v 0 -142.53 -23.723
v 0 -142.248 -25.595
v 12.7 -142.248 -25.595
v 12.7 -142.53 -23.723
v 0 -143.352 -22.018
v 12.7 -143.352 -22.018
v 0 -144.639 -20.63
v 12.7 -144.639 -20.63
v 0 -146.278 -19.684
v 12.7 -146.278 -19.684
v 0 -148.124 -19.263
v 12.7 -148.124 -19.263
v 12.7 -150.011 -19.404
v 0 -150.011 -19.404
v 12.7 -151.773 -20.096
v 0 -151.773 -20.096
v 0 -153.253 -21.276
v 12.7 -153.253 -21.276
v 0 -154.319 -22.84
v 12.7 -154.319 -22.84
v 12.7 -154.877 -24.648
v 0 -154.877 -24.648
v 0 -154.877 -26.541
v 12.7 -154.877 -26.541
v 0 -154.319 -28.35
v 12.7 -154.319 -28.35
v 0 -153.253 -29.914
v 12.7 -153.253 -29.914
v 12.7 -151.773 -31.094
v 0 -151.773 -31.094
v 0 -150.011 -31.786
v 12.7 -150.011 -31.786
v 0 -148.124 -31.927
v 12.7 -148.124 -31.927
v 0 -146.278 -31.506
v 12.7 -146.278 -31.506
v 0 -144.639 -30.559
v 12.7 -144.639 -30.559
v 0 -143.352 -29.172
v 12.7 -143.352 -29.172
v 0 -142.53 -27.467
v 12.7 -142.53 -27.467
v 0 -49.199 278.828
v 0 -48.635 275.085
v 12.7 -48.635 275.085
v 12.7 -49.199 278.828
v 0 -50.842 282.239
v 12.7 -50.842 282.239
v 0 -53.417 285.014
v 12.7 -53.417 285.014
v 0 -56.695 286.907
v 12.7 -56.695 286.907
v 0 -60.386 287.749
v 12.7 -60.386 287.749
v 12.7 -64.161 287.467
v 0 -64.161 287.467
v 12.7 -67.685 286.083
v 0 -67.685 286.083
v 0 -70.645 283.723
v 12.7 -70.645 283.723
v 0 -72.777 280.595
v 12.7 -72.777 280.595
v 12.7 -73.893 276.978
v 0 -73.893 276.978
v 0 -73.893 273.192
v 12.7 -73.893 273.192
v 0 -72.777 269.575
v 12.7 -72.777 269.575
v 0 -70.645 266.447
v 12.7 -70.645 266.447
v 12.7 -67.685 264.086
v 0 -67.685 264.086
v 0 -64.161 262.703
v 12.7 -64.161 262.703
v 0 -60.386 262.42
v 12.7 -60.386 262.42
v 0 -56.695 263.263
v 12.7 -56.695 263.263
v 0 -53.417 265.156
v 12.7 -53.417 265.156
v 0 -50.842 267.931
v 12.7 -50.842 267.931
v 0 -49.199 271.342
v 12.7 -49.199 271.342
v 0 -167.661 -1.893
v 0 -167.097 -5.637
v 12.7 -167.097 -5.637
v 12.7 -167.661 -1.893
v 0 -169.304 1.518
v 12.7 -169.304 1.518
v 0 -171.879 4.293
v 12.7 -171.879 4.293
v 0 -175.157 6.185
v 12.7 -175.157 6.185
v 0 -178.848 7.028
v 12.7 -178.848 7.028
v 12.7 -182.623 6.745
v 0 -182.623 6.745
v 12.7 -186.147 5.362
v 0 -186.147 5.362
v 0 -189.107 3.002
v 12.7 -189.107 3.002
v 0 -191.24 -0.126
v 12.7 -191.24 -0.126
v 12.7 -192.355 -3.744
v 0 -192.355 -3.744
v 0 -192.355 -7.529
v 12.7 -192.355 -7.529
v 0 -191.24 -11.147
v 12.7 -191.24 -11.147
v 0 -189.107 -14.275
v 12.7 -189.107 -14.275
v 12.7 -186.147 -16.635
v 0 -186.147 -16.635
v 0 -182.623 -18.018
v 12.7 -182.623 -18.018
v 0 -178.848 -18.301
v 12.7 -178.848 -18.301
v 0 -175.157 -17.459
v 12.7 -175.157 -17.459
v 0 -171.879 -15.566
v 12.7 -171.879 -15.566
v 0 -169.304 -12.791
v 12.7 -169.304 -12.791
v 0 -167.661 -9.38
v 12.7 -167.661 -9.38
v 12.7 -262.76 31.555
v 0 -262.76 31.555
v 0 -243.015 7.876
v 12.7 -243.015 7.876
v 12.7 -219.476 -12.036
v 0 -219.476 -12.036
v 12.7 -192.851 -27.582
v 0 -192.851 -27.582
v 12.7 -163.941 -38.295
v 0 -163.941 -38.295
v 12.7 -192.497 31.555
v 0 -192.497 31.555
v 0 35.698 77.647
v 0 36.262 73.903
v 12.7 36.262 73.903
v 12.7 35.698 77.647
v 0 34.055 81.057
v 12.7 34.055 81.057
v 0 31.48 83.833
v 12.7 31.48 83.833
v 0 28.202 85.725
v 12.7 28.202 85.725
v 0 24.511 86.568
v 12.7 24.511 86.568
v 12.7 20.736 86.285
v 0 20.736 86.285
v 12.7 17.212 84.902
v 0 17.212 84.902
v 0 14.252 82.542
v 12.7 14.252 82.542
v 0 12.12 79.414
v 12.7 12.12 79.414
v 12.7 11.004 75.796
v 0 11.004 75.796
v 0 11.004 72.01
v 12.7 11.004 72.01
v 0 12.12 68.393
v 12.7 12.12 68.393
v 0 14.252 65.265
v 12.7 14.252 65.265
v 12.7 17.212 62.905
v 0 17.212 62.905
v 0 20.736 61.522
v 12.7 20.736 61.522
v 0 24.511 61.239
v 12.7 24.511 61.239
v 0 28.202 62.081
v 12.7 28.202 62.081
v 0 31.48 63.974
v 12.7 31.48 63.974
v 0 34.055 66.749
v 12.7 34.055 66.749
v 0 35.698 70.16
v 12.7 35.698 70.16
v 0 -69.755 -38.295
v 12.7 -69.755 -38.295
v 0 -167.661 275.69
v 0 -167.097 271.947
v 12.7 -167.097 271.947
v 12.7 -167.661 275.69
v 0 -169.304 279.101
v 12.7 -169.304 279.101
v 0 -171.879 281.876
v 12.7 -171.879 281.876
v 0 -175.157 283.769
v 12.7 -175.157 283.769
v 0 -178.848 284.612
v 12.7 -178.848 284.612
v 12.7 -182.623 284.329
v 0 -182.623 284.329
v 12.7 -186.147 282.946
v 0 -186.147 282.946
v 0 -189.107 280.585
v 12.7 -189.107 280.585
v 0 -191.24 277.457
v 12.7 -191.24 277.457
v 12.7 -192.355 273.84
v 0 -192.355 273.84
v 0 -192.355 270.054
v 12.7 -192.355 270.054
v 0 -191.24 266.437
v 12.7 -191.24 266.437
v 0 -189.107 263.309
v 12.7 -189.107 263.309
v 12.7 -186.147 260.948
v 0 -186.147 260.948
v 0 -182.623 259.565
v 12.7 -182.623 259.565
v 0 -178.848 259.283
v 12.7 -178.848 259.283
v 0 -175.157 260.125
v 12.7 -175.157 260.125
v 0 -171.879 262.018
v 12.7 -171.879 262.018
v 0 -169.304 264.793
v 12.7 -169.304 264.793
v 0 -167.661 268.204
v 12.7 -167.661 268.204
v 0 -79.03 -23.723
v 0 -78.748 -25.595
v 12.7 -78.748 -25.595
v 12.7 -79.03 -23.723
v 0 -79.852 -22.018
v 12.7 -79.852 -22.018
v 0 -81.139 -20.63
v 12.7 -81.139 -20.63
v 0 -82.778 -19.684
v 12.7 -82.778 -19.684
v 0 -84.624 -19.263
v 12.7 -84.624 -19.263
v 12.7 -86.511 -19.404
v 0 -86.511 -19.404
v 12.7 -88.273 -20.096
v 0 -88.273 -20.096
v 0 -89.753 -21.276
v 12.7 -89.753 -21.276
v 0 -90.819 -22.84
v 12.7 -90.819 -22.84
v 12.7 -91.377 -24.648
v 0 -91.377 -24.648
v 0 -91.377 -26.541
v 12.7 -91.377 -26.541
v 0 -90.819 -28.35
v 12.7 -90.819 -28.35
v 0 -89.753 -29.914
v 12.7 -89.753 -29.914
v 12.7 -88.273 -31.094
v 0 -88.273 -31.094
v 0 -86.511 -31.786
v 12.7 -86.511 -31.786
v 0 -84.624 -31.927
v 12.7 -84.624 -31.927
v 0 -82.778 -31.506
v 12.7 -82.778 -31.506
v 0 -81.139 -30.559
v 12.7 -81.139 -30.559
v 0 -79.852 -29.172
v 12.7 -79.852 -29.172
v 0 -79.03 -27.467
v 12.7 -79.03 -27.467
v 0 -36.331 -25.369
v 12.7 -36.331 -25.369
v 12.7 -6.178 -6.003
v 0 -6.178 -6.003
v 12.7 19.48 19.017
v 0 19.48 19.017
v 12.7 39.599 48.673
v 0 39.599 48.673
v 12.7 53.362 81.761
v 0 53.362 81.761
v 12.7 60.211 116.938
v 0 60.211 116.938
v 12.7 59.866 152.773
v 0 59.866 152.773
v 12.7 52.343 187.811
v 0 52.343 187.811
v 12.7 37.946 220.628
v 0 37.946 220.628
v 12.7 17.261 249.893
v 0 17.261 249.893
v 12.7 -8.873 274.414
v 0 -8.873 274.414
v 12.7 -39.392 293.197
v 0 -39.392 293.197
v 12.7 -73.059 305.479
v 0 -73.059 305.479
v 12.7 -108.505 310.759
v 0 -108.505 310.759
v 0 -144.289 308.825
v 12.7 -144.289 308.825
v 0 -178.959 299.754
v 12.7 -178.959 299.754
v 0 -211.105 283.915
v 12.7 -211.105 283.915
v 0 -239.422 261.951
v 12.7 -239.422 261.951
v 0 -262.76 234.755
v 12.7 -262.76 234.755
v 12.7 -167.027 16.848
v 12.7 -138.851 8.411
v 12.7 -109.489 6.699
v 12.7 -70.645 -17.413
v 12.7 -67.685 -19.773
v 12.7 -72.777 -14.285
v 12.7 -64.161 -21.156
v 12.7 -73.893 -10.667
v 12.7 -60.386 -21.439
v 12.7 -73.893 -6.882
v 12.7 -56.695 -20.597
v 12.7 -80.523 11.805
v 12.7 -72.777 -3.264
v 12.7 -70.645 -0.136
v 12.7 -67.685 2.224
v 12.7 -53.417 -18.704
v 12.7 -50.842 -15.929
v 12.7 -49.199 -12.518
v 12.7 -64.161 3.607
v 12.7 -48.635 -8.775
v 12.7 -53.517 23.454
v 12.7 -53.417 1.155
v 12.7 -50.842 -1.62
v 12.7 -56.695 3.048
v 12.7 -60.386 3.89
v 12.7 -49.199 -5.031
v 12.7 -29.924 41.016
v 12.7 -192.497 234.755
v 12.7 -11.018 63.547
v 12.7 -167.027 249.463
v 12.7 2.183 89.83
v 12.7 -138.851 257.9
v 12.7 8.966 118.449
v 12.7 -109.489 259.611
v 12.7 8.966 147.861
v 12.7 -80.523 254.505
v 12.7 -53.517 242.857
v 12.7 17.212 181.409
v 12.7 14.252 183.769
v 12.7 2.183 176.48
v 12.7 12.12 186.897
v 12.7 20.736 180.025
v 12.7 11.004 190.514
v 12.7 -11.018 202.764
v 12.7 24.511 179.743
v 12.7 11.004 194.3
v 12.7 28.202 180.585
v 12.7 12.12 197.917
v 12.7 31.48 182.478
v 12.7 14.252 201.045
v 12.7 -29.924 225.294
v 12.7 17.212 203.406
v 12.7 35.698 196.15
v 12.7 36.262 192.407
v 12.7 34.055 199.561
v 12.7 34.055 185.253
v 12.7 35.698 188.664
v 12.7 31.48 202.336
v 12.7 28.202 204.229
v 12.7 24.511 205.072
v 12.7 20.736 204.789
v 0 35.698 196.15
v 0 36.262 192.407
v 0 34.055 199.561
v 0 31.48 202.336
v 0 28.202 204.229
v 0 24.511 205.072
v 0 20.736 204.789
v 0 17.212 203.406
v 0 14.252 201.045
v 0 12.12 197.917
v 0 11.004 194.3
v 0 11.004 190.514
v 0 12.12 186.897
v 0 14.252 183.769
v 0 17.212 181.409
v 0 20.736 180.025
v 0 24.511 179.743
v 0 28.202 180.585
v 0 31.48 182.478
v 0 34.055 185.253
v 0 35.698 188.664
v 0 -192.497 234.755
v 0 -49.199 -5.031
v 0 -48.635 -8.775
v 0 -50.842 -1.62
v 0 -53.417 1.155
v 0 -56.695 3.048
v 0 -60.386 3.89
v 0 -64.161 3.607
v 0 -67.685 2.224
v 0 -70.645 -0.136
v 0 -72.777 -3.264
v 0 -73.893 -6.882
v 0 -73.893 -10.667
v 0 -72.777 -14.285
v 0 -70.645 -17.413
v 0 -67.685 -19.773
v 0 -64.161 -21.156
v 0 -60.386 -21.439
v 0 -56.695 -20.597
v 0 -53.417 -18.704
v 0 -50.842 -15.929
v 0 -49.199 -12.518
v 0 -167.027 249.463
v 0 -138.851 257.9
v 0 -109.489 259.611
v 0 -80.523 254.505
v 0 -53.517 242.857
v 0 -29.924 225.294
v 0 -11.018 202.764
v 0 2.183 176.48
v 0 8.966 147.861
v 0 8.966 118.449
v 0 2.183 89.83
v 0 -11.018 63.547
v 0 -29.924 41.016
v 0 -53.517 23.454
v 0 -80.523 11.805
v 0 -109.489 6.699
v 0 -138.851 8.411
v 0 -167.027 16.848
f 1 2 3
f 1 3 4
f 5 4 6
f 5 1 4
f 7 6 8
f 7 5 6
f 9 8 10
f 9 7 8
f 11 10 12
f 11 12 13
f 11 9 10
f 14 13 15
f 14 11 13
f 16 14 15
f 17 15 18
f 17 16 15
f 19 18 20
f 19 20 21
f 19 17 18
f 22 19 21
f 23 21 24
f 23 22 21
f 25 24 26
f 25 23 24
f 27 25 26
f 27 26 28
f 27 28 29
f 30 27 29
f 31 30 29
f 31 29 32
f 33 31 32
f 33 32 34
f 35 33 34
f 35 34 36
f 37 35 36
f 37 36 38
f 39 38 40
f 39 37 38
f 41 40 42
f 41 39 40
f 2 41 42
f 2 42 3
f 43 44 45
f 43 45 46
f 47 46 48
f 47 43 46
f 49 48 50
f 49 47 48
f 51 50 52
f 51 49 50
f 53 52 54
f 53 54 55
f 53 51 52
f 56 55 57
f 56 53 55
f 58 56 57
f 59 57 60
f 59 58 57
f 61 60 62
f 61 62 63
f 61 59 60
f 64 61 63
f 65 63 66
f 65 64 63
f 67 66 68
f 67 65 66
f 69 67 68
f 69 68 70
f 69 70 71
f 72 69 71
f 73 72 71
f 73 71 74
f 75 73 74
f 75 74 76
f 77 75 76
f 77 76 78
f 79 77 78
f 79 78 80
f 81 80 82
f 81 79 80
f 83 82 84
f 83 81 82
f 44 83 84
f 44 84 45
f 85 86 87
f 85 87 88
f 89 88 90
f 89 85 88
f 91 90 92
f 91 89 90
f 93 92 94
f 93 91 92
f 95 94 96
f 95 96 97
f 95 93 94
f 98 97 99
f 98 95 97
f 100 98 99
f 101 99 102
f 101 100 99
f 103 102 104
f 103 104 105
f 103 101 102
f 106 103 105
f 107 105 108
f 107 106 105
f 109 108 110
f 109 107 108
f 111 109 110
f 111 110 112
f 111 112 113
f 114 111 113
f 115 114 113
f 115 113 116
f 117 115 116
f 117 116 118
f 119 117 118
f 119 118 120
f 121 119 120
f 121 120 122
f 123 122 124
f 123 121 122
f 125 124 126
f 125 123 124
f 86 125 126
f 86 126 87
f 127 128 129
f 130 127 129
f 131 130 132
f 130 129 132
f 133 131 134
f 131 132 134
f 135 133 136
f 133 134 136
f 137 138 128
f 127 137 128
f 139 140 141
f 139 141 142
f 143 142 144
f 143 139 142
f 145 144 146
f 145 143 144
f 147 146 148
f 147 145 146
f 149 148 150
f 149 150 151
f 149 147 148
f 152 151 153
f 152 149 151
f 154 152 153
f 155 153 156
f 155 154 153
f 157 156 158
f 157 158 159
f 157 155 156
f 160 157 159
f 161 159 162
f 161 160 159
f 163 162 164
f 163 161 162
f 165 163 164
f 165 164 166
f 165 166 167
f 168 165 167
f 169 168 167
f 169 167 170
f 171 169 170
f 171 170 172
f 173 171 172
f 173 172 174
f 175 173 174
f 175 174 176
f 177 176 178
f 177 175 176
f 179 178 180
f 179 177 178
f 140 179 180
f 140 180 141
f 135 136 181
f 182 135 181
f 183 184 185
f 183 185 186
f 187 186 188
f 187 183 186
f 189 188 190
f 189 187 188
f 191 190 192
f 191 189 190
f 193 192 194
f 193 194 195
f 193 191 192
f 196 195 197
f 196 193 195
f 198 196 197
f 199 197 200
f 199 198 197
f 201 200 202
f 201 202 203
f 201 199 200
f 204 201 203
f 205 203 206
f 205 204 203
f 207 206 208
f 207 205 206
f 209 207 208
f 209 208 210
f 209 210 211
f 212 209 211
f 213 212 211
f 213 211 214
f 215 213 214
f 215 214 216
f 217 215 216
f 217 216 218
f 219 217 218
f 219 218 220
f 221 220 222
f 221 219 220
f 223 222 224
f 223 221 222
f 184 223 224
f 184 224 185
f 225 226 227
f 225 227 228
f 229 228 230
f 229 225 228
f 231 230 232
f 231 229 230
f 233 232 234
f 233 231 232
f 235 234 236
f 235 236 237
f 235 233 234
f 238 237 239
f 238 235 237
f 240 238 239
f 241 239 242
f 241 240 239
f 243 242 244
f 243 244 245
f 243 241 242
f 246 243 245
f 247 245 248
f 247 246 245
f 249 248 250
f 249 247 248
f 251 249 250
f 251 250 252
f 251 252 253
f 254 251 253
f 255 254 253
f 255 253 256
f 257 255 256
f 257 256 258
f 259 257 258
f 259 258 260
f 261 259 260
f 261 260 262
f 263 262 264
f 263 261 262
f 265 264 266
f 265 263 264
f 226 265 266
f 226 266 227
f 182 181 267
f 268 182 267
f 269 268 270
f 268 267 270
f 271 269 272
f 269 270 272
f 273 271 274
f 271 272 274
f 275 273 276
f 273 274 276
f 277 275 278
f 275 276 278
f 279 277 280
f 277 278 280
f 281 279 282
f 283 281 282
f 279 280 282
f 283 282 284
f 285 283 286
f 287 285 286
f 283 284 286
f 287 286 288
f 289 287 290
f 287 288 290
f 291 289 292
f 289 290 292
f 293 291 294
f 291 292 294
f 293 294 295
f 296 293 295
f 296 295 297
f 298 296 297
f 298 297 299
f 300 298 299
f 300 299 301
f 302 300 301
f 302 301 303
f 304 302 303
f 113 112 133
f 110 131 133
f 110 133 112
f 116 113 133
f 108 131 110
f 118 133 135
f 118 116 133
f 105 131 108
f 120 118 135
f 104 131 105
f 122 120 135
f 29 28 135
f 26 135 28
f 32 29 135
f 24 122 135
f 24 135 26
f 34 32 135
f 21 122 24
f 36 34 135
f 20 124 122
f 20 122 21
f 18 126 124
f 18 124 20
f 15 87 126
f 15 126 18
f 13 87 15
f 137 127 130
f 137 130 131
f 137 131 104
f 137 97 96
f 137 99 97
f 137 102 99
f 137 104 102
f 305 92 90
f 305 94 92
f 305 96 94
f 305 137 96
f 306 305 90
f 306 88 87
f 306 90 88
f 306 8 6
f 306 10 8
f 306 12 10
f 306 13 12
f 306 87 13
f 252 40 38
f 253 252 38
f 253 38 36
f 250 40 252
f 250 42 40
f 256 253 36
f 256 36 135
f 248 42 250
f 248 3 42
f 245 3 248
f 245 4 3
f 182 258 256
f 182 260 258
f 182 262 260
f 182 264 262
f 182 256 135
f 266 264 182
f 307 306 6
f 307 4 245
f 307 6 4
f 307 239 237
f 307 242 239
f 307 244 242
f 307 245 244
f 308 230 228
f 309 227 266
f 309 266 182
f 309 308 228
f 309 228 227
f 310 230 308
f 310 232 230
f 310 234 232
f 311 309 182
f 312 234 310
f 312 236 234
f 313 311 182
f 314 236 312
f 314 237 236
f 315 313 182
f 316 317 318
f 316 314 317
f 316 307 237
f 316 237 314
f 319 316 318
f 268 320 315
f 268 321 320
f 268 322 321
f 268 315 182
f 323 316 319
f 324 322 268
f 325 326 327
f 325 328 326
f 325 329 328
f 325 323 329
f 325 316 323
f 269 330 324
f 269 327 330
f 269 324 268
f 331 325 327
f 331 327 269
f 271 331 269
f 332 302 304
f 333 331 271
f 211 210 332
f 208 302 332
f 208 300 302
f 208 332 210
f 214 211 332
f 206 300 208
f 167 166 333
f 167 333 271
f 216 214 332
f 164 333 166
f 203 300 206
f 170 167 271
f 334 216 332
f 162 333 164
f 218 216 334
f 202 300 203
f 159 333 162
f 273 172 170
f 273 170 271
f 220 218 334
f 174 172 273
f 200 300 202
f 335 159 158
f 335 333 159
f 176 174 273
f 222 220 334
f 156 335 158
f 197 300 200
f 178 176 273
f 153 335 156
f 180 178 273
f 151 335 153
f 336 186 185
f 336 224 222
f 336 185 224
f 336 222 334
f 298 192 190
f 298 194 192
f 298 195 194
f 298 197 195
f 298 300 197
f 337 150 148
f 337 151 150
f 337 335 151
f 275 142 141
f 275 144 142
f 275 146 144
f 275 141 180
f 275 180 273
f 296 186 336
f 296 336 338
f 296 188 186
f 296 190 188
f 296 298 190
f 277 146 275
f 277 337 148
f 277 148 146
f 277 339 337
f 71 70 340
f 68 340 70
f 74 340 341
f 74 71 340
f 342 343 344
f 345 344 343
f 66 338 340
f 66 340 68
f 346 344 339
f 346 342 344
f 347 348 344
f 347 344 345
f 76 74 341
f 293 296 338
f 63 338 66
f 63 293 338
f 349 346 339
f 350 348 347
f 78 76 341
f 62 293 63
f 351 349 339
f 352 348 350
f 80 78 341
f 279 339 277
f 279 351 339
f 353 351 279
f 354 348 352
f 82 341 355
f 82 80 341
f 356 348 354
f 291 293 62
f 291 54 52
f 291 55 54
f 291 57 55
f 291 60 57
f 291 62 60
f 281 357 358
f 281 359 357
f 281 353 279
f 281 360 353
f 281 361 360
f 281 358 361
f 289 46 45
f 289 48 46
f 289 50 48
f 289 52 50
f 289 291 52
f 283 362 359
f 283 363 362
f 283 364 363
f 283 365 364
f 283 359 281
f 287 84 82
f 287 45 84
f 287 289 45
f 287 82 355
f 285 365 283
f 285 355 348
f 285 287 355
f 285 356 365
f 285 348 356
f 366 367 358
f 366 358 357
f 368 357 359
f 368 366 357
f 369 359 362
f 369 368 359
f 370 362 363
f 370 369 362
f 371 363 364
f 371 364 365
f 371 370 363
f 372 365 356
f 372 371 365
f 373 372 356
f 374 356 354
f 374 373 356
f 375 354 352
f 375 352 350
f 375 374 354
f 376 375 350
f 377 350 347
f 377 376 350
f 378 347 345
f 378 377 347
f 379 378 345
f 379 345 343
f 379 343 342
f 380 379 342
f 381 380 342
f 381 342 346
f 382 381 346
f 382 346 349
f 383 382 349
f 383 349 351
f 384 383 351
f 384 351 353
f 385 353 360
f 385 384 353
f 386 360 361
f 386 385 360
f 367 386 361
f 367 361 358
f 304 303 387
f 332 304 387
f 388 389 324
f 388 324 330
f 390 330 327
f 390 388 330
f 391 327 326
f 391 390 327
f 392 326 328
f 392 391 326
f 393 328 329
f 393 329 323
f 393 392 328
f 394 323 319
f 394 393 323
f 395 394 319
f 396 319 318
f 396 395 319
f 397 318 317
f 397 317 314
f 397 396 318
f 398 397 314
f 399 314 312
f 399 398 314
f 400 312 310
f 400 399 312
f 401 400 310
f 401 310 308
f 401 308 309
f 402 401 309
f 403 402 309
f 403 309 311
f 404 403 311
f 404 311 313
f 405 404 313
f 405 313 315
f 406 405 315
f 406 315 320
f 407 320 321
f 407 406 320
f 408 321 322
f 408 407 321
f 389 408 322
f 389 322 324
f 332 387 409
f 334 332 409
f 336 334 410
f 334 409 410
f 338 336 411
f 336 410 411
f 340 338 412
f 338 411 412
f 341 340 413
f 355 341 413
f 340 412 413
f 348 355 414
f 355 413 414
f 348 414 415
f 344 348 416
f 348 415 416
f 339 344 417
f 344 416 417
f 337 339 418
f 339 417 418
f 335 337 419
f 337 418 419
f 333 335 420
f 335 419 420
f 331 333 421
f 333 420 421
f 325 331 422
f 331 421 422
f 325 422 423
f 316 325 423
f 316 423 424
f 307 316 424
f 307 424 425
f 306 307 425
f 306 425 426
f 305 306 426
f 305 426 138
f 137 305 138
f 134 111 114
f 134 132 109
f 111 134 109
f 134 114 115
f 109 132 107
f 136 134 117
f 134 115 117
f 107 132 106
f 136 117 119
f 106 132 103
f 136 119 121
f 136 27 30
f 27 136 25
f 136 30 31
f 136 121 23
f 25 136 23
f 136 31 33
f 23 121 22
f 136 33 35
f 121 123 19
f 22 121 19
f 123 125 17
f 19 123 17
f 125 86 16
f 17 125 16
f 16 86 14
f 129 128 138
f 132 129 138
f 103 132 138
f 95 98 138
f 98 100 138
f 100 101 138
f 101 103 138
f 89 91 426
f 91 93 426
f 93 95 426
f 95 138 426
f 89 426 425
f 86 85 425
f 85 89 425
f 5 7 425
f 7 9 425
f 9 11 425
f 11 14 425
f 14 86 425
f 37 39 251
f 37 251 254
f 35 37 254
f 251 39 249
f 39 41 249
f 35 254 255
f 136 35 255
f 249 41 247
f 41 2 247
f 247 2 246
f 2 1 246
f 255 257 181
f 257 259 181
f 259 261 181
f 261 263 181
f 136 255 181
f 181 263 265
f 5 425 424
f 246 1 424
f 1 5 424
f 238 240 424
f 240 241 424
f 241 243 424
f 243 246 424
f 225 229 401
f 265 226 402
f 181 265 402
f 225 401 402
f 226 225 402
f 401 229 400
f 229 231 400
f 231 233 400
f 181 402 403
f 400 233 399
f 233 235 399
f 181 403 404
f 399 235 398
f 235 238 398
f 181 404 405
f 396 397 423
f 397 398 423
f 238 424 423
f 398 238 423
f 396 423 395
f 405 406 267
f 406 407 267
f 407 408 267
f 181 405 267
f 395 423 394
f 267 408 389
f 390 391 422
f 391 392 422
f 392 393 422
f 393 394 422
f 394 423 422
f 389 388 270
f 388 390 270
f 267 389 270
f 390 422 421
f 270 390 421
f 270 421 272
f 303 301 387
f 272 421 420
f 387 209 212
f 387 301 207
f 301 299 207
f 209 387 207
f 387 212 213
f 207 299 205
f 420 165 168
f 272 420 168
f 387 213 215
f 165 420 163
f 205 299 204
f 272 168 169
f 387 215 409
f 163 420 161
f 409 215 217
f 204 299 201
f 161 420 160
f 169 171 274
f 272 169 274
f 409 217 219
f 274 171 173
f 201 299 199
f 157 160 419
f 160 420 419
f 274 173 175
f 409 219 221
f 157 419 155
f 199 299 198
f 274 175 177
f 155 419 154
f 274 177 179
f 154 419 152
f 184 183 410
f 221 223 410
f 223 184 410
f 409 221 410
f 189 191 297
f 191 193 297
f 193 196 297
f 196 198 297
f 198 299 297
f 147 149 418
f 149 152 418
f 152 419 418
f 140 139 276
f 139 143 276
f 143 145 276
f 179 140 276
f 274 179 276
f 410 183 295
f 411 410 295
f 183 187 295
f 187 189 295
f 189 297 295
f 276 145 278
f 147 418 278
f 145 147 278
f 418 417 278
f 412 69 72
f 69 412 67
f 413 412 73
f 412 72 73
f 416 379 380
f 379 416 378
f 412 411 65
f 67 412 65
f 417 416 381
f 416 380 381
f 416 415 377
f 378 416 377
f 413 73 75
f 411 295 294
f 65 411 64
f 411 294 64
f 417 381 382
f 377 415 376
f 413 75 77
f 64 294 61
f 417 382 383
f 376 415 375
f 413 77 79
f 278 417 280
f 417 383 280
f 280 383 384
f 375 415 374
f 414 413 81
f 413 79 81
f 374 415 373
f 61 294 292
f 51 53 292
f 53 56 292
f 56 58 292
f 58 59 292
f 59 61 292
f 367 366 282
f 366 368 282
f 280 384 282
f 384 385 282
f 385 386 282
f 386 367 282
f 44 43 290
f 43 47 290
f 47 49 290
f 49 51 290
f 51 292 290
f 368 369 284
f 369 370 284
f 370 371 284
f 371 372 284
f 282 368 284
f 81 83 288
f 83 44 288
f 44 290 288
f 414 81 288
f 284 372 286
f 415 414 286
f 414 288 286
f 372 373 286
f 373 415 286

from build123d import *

# Parameters (mm, degrees)
F0_R     = 6.35
F0_R_2   = 12.7
F1_DEPTH = 12.7


with BuildPart() as f1:
    # F0 (on Right) → F1 (new body)
    with BuildSketch(Plane.YZ):
        with BuildLine():
            Line((-192.497232, 31.555194), (-262.760009, 31.555194))
            ThreePointArc((-262.760009, 31.555194), (-219.475912, -12.035632), (-163.940978, -38.294806))
            Line((-163.940978, -38.294806), (-69.755258, -38.294806))
            ThreePointArc((-69.755258, -38.294806), (28.342708, 235.782988), (-262.760009, 234.755194))
            Line((-262.760009, 234.755194), (-192.497232, 234.755194))
            ThreePointArc((-192.497232, 234.755194), (9.822117, 133.155194), (-192.497232, 31.555194))
        make_face()
        with Locations((-148.598118, -25.594806)):
            Circle(F0_R, mode=Mode.SUBTRACT)
        with Locations((-179.797232, -5.636625)):
            Circle(F0_R_2, mode=Mode.SUBTRACT)
        with Locations((-85.098118, -25.594806)):
            Circle(F0_R, mode=Mode.SUBTRACT)
        with Locations((-61.33506, -8.774579)):
            Circle(F0_R_2, mode=Mode.SUBTRACT)
        with Locations((23.561913, 73.903331)):
            Circle(F0_R_2, mode=Mode.SUBTRACT)
        with Locations((-179.797232, 271.947013)):
            Circle(F0_R_2, mode=Mode.SUBTRACT)
        with Locations((23.561913, 192.407056)):
            Circle(F0_R_2, mode=Mode.SUBTRACT)
        with Locations((-61.33506, 275.084967)):
            Circle(F0_R_2, mode=Mode.SUBTRACT)
    extrude(amount=F1_DEPTH)


solid = f1.part
